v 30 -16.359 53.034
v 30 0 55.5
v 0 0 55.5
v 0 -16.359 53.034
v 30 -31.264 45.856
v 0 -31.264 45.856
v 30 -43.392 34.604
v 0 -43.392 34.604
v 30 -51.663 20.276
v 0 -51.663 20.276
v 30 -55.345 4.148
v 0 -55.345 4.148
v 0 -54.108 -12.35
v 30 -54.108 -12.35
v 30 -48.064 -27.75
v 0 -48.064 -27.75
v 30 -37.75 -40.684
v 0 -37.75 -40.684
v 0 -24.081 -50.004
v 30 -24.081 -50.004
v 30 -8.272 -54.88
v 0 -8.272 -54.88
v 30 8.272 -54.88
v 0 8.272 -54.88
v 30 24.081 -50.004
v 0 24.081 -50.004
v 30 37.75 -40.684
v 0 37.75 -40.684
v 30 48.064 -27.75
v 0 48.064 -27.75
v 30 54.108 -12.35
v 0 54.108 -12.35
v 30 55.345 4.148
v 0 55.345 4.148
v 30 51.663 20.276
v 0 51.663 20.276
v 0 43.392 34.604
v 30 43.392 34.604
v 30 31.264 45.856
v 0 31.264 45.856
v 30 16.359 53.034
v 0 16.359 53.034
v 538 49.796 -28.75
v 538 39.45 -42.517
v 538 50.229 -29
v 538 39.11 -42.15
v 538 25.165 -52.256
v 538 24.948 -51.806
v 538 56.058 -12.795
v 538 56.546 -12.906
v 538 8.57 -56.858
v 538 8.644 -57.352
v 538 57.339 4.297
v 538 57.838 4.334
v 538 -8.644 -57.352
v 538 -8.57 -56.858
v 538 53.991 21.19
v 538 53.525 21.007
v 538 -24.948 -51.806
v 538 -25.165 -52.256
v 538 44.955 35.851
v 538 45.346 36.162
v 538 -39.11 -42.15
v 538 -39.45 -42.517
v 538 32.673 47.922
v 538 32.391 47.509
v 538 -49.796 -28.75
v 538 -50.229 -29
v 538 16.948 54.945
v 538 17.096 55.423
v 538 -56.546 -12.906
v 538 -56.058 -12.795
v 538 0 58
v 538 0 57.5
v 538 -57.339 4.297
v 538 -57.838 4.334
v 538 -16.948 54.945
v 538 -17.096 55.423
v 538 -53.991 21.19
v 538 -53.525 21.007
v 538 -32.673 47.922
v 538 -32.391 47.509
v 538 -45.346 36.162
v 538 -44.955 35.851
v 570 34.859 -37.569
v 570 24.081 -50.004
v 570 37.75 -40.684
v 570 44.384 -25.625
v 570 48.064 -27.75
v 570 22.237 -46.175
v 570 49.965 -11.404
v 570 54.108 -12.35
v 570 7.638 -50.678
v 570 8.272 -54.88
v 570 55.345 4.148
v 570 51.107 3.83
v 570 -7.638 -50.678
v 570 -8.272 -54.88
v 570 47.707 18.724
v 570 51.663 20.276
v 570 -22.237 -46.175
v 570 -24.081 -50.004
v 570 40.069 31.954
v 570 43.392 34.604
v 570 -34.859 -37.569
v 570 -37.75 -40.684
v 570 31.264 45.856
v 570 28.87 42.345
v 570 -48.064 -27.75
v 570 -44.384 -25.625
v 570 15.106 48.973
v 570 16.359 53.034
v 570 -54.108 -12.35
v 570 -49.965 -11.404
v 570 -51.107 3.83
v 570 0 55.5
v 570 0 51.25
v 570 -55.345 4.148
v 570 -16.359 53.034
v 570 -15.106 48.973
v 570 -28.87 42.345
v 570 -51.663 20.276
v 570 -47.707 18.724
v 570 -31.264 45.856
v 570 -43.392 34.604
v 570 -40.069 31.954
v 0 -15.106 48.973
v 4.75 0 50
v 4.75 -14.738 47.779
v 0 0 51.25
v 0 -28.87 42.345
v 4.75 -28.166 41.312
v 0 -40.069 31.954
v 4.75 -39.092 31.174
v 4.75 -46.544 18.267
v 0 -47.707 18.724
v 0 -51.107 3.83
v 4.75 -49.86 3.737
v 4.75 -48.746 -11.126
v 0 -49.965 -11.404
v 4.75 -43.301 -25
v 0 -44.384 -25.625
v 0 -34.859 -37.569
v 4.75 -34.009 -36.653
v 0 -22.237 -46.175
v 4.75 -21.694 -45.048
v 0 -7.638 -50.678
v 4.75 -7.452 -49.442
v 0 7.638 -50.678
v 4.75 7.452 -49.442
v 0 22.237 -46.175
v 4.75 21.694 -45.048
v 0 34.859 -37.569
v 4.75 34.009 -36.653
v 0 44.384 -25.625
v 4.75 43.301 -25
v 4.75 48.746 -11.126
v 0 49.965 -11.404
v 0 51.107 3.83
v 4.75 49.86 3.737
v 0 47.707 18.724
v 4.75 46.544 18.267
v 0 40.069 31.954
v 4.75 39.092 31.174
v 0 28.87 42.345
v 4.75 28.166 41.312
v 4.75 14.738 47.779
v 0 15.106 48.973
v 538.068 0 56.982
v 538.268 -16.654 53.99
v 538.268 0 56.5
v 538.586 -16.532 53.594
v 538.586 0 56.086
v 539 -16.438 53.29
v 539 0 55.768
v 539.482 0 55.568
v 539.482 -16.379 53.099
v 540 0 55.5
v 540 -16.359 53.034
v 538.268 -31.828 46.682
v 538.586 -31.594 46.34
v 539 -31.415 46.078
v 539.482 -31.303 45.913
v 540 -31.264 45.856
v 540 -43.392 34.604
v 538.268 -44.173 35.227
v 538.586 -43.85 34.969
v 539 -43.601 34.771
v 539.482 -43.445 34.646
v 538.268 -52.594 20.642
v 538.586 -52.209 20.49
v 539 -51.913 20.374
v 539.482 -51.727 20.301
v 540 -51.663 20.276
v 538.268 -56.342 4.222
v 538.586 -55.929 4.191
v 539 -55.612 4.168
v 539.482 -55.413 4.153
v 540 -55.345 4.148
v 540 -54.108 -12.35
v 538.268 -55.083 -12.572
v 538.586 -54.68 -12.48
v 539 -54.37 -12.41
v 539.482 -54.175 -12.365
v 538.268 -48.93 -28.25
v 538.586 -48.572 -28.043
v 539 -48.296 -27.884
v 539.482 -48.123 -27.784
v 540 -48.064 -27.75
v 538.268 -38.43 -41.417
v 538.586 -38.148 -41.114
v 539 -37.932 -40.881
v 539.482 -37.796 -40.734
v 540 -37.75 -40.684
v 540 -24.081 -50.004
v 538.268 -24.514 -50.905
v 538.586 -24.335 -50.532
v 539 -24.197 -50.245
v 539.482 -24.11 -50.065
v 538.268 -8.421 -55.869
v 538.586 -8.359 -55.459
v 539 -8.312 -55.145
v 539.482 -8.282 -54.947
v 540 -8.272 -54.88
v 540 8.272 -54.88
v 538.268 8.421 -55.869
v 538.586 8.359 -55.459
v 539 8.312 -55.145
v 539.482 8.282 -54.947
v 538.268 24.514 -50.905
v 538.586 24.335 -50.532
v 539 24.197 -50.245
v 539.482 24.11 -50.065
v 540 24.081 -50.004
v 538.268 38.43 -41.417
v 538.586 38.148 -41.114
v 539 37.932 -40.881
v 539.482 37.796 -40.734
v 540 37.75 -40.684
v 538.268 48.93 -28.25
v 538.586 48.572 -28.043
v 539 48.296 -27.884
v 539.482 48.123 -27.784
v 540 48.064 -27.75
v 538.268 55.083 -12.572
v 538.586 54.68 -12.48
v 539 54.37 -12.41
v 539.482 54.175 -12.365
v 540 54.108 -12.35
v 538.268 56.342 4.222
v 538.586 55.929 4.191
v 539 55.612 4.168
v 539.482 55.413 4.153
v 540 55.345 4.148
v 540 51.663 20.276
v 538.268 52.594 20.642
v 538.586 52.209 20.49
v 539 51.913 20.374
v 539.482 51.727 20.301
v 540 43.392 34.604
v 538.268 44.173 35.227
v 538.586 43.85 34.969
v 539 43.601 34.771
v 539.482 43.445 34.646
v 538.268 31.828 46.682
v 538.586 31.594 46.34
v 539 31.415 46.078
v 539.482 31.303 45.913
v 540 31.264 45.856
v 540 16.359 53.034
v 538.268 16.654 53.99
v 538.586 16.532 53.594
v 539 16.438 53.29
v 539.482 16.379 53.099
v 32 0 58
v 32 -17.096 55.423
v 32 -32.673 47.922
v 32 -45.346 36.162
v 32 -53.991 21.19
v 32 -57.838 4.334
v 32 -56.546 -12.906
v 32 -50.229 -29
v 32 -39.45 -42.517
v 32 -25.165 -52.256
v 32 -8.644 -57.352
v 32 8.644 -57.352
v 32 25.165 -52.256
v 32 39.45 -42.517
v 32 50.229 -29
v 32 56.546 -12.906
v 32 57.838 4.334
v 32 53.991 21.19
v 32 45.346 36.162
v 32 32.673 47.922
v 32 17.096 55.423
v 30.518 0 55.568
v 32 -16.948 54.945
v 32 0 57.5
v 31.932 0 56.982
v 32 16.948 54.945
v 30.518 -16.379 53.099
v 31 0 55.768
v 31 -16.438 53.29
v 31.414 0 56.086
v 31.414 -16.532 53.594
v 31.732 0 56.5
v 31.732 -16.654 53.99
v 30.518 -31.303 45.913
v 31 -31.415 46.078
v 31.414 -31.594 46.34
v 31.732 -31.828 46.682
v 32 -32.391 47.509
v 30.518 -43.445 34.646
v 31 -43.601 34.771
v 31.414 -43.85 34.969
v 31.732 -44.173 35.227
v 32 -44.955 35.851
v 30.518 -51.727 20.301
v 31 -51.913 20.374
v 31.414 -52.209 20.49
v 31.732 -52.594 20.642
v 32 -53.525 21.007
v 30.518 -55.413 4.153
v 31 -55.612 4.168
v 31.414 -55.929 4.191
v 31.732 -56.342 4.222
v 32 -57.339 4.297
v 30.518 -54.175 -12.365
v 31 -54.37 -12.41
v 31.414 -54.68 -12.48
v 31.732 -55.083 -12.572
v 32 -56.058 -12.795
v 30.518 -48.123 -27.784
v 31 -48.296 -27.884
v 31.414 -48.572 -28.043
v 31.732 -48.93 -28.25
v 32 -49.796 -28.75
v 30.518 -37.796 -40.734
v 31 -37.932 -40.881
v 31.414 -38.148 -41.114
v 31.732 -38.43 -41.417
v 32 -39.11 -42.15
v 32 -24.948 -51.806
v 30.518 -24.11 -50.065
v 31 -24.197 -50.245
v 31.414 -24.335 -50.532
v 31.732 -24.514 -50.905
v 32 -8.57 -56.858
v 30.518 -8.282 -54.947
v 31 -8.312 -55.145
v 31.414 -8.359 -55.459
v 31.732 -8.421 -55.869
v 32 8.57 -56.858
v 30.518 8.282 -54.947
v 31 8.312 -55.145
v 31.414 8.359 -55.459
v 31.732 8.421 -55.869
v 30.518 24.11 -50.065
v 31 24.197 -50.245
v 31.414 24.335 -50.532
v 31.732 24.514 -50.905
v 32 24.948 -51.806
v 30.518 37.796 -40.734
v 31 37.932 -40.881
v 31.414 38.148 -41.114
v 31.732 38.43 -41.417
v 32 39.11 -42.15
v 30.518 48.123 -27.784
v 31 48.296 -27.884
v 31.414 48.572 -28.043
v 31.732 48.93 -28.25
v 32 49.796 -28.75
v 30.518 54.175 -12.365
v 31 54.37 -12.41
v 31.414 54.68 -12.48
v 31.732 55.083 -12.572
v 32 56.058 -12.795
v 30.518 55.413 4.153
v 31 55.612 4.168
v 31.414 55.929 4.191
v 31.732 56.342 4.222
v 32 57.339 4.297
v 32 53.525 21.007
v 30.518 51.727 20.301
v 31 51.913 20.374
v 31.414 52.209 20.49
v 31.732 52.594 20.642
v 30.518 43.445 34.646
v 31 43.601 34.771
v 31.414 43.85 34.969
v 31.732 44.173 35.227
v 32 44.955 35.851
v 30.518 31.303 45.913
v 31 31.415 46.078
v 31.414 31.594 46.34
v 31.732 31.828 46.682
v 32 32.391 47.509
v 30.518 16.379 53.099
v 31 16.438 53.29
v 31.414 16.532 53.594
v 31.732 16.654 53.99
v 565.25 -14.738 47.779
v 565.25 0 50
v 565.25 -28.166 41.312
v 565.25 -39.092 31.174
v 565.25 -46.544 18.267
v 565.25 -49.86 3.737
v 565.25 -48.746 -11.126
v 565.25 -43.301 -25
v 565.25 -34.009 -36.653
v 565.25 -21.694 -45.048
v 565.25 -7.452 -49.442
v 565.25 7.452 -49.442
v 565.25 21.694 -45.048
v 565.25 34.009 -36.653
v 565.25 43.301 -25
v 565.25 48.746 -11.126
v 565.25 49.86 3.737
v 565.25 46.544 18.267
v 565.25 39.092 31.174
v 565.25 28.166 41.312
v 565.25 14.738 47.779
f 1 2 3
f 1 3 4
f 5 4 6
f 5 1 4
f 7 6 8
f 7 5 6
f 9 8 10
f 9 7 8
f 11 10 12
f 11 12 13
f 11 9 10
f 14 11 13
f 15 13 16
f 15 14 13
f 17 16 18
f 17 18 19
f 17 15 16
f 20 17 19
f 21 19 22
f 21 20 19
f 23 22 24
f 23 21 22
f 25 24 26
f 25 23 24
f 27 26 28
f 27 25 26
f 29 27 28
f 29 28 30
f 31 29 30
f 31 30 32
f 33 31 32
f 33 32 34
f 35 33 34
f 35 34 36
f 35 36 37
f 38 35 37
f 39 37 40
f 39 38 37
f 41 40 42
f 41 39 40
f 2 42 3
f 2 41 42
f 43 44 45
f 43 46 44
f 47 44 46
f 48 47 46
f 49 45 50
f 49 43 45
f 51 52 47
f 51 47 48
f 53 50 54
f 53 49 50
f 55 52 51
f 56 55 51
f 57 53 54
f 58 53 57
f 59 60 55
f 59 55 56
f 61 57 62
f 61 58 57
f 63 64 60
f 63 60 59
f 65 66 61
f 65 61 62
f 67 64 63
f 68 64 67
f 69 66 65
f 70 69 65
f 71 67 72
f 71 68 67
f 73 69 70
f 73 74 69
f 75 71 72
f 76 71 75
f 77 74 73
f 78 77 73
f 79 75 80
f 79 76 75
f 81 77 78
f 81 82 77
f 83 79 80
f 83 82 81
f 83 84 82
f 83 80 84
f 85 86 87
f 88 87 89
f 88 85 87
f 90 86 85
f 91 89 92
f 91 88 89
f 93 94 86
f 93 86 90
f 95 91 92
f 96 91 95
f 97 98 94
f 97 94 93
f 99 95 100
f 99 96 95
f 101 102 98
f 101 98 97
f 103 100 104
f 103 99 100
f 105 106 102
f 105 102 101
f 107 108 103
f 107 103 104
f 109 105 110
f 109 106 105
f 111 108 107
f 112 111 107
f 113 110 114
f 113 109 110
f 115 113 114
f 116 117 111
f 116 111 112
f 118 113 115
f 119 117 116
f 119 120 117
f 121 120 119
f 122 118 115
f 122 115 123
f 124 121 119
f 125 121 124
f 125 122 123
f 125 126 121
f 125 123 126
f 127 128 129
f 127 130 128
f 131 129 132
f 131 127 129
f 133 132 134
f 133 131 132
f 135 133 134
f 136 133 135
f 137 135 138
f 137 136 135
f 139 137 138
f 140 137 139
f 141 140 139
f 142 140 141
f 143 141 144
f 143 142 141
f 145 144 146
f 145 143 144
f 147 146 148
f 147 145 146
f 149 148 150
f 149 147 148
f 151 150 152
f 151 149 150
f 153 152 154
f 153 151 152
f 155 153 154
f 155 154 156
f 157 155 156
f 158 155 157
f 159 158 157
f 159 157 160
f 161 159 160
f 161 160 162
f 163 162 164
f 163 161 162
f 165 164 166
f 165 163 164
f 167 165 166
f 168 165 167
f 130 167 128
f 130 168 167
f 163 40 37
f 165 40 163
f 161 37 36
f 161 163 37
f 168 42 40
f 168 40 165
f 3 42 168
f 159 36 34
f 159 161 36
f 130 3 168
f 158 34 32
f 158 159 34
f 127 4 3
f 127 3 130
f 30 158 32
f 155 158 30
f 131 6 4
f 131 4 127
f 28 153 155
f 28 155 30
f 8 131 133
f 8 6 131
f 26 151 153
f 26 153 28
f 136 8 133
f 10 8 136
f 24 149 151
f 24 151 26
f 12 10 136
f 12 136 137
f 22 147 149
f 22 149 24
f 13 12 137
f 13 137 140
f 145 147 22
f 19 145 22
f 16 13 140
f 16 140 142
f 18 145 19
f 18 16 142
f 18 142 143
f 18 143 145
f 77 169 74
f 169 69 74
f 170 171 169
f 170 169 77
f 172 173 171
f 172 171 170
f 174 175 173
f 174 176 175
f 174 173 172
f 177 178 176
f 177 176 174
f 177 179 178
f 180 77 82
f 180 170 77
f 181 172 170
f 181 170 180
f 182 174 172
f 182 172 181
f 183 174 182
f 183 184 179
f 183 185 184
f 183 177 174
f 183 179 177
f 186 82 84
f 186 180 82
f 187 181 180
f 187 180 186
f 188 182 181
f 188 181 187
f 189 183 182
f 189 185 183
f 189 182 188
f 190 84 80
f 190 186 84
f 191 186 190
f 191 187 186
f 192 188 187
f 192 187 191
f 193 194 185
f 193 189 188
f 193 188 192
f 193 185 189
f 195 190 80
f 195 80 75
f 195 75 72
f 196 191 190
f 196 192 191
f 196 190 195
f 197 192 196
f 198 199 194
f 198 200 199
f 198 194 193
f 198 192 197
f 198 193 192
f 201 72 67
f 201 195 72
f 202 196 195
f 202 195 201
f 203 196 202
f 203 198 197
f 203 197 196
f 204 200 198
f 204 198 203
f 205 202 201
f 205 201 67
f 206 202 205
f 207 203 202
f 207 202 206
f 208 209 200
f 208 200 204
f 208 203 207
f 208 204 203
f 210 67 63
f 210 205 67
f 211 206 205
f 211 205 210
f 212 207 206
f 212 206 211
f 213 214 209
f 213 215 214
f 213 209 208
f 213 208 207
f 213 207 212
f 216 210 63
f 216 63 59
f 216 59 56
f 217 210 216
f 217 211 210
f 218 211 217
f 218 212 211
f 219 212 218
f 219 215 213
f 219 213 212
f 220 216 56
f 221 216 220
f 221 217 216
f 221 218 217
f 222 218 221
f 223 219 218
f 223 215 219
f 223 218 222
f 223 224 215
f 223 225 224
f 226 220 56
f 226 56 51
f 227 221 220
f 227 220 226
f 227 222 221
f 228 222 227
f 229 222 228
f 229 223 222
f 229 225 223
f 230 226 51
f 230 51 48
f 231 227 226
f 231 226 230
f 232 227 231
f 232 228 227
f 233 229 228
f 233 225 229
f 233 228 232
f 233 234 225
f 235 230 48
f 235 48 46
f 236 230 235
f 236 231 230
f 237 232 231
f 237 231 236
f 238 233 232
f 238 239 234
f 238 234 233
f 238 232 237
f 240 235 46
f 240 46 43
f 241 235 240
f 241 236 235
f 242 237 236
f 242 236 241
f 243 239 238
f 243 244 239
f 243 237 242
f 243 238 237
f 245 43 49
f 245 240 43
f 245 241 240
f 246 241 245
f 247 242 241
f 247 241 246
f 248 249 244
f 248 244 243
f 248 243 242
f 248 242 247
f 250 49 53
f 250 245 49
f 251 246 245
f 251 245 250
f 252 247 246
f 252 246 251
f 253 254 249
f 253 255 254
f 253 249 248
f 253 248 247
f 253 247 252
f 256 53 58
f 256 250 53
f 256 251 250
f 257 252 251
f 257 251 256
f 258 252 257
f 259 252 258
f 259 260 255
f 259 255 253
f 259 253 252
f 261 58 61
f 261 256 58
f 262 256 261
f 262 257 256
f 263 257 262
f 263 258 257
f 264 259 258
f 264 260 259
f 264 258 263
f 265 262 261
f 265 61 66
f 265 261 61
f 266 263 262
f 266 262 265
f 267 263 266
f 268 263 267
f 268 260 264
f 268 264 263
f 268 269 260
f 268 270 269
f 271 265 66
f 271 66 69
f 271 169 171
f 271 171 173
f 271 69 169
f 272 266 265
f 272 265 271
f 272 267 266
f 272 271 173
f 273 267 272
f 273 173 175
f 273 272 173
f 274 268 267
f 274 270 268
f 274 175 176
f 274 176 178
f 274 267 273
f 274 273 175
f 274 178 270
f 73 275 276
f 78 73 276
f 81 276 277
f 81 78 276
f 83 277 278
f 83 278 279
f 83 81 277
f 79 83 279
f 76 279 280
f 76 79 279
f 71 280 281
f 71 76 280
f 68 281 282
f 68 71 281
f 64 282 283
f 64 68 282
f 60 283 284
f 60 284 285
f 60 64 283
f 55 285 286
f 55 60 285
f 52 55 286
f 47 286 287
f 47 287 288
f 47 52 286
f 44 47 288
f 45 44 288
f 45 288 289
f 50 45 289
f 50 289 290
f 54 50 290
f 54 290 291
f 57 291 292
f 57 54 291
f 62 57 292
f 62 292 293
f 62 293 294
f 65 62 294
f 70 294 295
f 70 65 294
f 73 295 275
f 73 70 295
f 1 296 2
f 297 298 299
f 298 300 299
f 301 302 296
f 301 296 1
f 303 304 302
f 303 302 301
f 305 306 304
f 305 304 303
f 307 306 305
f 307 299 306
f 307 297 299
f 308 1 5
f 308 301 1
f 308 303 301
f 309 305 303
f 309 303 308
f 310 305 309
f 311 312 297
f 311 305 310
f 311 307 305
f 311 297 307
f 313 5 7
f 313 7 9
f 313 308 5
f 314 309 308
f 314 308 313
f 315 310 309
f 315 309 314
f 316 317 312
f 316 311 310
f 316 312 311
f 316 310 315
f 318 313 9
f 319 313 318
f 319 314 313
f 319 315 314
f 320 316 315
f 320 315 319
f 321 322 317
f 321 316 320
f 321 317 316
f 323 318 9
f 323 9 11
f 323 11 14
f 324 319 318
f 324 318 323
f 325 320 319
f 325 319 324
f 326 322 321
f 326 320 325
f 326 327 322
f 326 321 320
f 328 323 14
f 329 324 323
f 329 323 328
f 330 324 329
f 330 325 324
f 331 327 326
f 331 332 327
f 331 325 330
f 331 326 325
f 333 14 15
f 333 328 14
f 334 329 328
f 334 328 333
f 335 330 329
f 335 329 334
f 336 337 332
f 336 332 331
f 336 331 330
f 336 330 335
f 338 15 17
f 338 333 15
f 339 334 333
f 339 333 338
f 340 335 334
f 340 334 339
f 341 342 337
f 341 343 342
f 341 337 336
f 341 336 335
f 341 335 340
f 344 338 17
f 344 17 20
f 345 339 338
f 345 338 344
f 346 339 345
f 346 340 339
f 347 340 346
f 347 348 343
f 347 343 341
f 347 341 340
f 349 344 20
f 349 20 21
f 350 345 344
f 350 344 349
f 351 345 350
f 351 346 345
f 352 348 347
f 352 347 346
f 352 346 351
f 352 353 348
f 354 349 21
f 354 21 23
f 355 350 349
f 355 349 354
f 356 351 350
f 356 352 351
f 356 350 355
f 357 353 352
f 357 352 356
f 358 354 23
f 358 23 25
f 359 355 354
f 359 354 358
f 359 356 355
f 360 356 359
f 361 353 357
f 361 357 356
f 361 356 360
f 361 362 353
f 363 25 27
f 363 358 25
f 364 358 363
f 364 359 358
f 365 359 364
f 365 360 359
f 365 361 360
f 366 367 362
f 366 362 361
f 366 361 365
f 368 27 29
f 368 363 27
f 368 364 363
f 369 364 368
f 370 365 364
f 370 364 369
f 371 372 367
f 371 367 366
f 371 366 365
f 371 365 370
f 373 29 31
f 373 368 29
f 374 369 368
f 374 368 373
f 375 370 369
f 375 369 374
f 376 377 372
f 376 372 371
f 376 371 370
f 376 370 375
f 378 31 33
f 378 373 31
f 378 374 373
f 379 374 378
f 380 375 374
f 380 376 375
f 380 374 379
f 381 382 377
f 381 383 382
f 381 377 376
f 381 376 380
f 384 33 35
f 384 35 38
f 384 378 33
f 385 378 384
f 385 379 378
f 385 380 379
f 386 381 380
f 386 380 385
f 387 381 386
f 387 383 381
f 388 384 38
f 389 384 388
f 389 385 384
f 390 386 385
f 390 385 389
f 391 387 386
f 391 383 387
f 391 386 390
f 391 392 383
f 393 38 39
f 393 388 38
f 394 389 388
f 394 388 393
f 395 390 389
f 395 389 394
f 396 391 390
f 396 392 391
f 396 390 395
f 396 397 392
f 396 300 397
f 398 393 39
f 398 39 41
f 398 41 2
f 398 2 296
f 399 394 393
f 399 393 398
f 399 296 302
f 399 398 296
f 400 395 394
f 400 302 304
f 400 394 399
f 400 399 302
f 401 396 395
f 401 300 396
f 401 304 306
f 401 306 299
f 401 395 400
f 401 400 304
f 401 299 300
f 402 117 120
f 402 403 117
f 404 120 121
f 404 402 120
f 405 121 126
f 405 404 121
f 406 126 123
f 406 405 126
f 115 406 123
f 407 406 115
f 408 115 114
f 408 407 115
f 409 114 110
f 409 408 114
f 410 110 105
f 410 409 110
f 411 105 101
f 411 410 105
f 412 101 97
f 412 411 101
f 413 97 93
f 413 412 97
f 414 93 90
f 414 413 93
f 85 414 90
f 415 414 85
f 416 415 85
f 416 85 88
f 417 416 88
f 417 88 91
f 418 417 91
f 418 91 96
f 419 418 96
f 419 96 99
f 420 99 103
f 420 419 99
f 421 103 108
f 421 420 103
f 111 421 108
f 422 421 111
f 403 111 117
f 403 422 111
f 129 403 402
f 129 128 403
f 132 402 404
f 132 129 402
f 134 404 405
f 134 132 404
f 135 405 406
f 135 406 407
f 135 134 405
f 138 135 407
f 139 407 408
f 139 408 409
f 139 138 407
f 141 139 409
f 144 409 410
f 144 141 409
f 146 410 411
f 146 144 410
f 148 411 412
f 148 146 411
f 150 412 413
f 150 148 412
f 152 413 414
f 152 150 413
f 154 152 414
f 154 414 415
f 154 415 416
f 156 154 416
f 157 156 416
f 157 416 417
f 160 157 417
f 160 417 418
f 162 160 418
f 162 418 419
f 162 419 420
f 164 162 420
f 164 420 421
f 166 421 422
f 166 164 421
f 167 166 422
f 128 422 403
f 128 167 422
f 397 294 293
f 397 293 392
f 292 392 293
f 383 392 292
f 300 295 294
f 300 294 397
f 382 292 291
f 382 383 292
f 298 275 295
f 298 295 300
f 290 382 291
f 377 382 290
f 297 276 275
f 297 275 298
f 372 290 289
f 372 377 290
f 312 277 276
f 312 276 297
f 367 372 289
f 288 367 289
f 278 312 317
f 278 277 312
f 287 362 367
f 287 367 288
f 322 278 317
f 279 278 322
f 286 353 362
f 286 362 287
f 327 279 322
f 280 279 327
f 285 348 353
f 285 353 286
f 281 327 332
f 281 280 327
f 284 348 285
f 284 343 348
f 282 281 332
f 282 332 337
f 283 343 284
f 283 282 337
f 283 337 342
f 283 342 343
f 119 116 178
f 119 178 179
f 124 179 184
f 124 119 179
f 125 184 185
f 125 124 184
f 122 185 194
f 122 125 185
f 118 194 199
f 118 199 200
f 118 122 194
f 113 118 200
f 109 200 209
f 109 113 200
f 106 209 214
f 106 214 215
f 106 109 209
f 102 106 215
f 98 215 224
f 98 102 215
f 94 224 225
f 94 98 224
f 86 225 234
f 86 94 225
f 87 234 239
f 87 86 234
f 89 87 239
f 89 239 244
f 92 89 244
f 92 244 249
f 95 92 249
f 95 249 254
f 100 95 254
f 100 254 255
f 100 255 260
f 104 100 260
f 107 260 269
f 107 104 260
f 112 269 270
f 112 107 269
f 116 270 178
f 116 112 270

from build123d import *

# Parameters (mm, degrees)
FILLET1_R = 2


with BuildPart() as part:
    # Sketch1 → Revolve1 (revolve)
    with BuildSketch(Plane(origin=(0, 0, 0), x_dir=(1, 0, 0), z_dir=(0, 1, 0)), mode=Mode.PRIVATE) as revolve1_sk:
        Polygon((0, 51.25), (0, 55.5), (32, 55.5), (32, 58), (538, 58), (538, 55.5), (570, 55.5), (570, 51.25), (565.25, 50), (4.75, 50), align=None)
    revolve(revolve1_sk.sketch.rotate(Axis((0, 0, 0), (1, 0, 0)), 180), axis=Axis((0, 0, 0), (1, 0, 0)))

    # Fillet1
    fillet1_edges = [part.edges().sort_by_distance(p)[0] for p in [
        (32, 0, -55.5),
        (538, 0, -55.5),
    ]]
    fillet(fillet1_edges, radius=FILLET1_R)


solid = part.part
